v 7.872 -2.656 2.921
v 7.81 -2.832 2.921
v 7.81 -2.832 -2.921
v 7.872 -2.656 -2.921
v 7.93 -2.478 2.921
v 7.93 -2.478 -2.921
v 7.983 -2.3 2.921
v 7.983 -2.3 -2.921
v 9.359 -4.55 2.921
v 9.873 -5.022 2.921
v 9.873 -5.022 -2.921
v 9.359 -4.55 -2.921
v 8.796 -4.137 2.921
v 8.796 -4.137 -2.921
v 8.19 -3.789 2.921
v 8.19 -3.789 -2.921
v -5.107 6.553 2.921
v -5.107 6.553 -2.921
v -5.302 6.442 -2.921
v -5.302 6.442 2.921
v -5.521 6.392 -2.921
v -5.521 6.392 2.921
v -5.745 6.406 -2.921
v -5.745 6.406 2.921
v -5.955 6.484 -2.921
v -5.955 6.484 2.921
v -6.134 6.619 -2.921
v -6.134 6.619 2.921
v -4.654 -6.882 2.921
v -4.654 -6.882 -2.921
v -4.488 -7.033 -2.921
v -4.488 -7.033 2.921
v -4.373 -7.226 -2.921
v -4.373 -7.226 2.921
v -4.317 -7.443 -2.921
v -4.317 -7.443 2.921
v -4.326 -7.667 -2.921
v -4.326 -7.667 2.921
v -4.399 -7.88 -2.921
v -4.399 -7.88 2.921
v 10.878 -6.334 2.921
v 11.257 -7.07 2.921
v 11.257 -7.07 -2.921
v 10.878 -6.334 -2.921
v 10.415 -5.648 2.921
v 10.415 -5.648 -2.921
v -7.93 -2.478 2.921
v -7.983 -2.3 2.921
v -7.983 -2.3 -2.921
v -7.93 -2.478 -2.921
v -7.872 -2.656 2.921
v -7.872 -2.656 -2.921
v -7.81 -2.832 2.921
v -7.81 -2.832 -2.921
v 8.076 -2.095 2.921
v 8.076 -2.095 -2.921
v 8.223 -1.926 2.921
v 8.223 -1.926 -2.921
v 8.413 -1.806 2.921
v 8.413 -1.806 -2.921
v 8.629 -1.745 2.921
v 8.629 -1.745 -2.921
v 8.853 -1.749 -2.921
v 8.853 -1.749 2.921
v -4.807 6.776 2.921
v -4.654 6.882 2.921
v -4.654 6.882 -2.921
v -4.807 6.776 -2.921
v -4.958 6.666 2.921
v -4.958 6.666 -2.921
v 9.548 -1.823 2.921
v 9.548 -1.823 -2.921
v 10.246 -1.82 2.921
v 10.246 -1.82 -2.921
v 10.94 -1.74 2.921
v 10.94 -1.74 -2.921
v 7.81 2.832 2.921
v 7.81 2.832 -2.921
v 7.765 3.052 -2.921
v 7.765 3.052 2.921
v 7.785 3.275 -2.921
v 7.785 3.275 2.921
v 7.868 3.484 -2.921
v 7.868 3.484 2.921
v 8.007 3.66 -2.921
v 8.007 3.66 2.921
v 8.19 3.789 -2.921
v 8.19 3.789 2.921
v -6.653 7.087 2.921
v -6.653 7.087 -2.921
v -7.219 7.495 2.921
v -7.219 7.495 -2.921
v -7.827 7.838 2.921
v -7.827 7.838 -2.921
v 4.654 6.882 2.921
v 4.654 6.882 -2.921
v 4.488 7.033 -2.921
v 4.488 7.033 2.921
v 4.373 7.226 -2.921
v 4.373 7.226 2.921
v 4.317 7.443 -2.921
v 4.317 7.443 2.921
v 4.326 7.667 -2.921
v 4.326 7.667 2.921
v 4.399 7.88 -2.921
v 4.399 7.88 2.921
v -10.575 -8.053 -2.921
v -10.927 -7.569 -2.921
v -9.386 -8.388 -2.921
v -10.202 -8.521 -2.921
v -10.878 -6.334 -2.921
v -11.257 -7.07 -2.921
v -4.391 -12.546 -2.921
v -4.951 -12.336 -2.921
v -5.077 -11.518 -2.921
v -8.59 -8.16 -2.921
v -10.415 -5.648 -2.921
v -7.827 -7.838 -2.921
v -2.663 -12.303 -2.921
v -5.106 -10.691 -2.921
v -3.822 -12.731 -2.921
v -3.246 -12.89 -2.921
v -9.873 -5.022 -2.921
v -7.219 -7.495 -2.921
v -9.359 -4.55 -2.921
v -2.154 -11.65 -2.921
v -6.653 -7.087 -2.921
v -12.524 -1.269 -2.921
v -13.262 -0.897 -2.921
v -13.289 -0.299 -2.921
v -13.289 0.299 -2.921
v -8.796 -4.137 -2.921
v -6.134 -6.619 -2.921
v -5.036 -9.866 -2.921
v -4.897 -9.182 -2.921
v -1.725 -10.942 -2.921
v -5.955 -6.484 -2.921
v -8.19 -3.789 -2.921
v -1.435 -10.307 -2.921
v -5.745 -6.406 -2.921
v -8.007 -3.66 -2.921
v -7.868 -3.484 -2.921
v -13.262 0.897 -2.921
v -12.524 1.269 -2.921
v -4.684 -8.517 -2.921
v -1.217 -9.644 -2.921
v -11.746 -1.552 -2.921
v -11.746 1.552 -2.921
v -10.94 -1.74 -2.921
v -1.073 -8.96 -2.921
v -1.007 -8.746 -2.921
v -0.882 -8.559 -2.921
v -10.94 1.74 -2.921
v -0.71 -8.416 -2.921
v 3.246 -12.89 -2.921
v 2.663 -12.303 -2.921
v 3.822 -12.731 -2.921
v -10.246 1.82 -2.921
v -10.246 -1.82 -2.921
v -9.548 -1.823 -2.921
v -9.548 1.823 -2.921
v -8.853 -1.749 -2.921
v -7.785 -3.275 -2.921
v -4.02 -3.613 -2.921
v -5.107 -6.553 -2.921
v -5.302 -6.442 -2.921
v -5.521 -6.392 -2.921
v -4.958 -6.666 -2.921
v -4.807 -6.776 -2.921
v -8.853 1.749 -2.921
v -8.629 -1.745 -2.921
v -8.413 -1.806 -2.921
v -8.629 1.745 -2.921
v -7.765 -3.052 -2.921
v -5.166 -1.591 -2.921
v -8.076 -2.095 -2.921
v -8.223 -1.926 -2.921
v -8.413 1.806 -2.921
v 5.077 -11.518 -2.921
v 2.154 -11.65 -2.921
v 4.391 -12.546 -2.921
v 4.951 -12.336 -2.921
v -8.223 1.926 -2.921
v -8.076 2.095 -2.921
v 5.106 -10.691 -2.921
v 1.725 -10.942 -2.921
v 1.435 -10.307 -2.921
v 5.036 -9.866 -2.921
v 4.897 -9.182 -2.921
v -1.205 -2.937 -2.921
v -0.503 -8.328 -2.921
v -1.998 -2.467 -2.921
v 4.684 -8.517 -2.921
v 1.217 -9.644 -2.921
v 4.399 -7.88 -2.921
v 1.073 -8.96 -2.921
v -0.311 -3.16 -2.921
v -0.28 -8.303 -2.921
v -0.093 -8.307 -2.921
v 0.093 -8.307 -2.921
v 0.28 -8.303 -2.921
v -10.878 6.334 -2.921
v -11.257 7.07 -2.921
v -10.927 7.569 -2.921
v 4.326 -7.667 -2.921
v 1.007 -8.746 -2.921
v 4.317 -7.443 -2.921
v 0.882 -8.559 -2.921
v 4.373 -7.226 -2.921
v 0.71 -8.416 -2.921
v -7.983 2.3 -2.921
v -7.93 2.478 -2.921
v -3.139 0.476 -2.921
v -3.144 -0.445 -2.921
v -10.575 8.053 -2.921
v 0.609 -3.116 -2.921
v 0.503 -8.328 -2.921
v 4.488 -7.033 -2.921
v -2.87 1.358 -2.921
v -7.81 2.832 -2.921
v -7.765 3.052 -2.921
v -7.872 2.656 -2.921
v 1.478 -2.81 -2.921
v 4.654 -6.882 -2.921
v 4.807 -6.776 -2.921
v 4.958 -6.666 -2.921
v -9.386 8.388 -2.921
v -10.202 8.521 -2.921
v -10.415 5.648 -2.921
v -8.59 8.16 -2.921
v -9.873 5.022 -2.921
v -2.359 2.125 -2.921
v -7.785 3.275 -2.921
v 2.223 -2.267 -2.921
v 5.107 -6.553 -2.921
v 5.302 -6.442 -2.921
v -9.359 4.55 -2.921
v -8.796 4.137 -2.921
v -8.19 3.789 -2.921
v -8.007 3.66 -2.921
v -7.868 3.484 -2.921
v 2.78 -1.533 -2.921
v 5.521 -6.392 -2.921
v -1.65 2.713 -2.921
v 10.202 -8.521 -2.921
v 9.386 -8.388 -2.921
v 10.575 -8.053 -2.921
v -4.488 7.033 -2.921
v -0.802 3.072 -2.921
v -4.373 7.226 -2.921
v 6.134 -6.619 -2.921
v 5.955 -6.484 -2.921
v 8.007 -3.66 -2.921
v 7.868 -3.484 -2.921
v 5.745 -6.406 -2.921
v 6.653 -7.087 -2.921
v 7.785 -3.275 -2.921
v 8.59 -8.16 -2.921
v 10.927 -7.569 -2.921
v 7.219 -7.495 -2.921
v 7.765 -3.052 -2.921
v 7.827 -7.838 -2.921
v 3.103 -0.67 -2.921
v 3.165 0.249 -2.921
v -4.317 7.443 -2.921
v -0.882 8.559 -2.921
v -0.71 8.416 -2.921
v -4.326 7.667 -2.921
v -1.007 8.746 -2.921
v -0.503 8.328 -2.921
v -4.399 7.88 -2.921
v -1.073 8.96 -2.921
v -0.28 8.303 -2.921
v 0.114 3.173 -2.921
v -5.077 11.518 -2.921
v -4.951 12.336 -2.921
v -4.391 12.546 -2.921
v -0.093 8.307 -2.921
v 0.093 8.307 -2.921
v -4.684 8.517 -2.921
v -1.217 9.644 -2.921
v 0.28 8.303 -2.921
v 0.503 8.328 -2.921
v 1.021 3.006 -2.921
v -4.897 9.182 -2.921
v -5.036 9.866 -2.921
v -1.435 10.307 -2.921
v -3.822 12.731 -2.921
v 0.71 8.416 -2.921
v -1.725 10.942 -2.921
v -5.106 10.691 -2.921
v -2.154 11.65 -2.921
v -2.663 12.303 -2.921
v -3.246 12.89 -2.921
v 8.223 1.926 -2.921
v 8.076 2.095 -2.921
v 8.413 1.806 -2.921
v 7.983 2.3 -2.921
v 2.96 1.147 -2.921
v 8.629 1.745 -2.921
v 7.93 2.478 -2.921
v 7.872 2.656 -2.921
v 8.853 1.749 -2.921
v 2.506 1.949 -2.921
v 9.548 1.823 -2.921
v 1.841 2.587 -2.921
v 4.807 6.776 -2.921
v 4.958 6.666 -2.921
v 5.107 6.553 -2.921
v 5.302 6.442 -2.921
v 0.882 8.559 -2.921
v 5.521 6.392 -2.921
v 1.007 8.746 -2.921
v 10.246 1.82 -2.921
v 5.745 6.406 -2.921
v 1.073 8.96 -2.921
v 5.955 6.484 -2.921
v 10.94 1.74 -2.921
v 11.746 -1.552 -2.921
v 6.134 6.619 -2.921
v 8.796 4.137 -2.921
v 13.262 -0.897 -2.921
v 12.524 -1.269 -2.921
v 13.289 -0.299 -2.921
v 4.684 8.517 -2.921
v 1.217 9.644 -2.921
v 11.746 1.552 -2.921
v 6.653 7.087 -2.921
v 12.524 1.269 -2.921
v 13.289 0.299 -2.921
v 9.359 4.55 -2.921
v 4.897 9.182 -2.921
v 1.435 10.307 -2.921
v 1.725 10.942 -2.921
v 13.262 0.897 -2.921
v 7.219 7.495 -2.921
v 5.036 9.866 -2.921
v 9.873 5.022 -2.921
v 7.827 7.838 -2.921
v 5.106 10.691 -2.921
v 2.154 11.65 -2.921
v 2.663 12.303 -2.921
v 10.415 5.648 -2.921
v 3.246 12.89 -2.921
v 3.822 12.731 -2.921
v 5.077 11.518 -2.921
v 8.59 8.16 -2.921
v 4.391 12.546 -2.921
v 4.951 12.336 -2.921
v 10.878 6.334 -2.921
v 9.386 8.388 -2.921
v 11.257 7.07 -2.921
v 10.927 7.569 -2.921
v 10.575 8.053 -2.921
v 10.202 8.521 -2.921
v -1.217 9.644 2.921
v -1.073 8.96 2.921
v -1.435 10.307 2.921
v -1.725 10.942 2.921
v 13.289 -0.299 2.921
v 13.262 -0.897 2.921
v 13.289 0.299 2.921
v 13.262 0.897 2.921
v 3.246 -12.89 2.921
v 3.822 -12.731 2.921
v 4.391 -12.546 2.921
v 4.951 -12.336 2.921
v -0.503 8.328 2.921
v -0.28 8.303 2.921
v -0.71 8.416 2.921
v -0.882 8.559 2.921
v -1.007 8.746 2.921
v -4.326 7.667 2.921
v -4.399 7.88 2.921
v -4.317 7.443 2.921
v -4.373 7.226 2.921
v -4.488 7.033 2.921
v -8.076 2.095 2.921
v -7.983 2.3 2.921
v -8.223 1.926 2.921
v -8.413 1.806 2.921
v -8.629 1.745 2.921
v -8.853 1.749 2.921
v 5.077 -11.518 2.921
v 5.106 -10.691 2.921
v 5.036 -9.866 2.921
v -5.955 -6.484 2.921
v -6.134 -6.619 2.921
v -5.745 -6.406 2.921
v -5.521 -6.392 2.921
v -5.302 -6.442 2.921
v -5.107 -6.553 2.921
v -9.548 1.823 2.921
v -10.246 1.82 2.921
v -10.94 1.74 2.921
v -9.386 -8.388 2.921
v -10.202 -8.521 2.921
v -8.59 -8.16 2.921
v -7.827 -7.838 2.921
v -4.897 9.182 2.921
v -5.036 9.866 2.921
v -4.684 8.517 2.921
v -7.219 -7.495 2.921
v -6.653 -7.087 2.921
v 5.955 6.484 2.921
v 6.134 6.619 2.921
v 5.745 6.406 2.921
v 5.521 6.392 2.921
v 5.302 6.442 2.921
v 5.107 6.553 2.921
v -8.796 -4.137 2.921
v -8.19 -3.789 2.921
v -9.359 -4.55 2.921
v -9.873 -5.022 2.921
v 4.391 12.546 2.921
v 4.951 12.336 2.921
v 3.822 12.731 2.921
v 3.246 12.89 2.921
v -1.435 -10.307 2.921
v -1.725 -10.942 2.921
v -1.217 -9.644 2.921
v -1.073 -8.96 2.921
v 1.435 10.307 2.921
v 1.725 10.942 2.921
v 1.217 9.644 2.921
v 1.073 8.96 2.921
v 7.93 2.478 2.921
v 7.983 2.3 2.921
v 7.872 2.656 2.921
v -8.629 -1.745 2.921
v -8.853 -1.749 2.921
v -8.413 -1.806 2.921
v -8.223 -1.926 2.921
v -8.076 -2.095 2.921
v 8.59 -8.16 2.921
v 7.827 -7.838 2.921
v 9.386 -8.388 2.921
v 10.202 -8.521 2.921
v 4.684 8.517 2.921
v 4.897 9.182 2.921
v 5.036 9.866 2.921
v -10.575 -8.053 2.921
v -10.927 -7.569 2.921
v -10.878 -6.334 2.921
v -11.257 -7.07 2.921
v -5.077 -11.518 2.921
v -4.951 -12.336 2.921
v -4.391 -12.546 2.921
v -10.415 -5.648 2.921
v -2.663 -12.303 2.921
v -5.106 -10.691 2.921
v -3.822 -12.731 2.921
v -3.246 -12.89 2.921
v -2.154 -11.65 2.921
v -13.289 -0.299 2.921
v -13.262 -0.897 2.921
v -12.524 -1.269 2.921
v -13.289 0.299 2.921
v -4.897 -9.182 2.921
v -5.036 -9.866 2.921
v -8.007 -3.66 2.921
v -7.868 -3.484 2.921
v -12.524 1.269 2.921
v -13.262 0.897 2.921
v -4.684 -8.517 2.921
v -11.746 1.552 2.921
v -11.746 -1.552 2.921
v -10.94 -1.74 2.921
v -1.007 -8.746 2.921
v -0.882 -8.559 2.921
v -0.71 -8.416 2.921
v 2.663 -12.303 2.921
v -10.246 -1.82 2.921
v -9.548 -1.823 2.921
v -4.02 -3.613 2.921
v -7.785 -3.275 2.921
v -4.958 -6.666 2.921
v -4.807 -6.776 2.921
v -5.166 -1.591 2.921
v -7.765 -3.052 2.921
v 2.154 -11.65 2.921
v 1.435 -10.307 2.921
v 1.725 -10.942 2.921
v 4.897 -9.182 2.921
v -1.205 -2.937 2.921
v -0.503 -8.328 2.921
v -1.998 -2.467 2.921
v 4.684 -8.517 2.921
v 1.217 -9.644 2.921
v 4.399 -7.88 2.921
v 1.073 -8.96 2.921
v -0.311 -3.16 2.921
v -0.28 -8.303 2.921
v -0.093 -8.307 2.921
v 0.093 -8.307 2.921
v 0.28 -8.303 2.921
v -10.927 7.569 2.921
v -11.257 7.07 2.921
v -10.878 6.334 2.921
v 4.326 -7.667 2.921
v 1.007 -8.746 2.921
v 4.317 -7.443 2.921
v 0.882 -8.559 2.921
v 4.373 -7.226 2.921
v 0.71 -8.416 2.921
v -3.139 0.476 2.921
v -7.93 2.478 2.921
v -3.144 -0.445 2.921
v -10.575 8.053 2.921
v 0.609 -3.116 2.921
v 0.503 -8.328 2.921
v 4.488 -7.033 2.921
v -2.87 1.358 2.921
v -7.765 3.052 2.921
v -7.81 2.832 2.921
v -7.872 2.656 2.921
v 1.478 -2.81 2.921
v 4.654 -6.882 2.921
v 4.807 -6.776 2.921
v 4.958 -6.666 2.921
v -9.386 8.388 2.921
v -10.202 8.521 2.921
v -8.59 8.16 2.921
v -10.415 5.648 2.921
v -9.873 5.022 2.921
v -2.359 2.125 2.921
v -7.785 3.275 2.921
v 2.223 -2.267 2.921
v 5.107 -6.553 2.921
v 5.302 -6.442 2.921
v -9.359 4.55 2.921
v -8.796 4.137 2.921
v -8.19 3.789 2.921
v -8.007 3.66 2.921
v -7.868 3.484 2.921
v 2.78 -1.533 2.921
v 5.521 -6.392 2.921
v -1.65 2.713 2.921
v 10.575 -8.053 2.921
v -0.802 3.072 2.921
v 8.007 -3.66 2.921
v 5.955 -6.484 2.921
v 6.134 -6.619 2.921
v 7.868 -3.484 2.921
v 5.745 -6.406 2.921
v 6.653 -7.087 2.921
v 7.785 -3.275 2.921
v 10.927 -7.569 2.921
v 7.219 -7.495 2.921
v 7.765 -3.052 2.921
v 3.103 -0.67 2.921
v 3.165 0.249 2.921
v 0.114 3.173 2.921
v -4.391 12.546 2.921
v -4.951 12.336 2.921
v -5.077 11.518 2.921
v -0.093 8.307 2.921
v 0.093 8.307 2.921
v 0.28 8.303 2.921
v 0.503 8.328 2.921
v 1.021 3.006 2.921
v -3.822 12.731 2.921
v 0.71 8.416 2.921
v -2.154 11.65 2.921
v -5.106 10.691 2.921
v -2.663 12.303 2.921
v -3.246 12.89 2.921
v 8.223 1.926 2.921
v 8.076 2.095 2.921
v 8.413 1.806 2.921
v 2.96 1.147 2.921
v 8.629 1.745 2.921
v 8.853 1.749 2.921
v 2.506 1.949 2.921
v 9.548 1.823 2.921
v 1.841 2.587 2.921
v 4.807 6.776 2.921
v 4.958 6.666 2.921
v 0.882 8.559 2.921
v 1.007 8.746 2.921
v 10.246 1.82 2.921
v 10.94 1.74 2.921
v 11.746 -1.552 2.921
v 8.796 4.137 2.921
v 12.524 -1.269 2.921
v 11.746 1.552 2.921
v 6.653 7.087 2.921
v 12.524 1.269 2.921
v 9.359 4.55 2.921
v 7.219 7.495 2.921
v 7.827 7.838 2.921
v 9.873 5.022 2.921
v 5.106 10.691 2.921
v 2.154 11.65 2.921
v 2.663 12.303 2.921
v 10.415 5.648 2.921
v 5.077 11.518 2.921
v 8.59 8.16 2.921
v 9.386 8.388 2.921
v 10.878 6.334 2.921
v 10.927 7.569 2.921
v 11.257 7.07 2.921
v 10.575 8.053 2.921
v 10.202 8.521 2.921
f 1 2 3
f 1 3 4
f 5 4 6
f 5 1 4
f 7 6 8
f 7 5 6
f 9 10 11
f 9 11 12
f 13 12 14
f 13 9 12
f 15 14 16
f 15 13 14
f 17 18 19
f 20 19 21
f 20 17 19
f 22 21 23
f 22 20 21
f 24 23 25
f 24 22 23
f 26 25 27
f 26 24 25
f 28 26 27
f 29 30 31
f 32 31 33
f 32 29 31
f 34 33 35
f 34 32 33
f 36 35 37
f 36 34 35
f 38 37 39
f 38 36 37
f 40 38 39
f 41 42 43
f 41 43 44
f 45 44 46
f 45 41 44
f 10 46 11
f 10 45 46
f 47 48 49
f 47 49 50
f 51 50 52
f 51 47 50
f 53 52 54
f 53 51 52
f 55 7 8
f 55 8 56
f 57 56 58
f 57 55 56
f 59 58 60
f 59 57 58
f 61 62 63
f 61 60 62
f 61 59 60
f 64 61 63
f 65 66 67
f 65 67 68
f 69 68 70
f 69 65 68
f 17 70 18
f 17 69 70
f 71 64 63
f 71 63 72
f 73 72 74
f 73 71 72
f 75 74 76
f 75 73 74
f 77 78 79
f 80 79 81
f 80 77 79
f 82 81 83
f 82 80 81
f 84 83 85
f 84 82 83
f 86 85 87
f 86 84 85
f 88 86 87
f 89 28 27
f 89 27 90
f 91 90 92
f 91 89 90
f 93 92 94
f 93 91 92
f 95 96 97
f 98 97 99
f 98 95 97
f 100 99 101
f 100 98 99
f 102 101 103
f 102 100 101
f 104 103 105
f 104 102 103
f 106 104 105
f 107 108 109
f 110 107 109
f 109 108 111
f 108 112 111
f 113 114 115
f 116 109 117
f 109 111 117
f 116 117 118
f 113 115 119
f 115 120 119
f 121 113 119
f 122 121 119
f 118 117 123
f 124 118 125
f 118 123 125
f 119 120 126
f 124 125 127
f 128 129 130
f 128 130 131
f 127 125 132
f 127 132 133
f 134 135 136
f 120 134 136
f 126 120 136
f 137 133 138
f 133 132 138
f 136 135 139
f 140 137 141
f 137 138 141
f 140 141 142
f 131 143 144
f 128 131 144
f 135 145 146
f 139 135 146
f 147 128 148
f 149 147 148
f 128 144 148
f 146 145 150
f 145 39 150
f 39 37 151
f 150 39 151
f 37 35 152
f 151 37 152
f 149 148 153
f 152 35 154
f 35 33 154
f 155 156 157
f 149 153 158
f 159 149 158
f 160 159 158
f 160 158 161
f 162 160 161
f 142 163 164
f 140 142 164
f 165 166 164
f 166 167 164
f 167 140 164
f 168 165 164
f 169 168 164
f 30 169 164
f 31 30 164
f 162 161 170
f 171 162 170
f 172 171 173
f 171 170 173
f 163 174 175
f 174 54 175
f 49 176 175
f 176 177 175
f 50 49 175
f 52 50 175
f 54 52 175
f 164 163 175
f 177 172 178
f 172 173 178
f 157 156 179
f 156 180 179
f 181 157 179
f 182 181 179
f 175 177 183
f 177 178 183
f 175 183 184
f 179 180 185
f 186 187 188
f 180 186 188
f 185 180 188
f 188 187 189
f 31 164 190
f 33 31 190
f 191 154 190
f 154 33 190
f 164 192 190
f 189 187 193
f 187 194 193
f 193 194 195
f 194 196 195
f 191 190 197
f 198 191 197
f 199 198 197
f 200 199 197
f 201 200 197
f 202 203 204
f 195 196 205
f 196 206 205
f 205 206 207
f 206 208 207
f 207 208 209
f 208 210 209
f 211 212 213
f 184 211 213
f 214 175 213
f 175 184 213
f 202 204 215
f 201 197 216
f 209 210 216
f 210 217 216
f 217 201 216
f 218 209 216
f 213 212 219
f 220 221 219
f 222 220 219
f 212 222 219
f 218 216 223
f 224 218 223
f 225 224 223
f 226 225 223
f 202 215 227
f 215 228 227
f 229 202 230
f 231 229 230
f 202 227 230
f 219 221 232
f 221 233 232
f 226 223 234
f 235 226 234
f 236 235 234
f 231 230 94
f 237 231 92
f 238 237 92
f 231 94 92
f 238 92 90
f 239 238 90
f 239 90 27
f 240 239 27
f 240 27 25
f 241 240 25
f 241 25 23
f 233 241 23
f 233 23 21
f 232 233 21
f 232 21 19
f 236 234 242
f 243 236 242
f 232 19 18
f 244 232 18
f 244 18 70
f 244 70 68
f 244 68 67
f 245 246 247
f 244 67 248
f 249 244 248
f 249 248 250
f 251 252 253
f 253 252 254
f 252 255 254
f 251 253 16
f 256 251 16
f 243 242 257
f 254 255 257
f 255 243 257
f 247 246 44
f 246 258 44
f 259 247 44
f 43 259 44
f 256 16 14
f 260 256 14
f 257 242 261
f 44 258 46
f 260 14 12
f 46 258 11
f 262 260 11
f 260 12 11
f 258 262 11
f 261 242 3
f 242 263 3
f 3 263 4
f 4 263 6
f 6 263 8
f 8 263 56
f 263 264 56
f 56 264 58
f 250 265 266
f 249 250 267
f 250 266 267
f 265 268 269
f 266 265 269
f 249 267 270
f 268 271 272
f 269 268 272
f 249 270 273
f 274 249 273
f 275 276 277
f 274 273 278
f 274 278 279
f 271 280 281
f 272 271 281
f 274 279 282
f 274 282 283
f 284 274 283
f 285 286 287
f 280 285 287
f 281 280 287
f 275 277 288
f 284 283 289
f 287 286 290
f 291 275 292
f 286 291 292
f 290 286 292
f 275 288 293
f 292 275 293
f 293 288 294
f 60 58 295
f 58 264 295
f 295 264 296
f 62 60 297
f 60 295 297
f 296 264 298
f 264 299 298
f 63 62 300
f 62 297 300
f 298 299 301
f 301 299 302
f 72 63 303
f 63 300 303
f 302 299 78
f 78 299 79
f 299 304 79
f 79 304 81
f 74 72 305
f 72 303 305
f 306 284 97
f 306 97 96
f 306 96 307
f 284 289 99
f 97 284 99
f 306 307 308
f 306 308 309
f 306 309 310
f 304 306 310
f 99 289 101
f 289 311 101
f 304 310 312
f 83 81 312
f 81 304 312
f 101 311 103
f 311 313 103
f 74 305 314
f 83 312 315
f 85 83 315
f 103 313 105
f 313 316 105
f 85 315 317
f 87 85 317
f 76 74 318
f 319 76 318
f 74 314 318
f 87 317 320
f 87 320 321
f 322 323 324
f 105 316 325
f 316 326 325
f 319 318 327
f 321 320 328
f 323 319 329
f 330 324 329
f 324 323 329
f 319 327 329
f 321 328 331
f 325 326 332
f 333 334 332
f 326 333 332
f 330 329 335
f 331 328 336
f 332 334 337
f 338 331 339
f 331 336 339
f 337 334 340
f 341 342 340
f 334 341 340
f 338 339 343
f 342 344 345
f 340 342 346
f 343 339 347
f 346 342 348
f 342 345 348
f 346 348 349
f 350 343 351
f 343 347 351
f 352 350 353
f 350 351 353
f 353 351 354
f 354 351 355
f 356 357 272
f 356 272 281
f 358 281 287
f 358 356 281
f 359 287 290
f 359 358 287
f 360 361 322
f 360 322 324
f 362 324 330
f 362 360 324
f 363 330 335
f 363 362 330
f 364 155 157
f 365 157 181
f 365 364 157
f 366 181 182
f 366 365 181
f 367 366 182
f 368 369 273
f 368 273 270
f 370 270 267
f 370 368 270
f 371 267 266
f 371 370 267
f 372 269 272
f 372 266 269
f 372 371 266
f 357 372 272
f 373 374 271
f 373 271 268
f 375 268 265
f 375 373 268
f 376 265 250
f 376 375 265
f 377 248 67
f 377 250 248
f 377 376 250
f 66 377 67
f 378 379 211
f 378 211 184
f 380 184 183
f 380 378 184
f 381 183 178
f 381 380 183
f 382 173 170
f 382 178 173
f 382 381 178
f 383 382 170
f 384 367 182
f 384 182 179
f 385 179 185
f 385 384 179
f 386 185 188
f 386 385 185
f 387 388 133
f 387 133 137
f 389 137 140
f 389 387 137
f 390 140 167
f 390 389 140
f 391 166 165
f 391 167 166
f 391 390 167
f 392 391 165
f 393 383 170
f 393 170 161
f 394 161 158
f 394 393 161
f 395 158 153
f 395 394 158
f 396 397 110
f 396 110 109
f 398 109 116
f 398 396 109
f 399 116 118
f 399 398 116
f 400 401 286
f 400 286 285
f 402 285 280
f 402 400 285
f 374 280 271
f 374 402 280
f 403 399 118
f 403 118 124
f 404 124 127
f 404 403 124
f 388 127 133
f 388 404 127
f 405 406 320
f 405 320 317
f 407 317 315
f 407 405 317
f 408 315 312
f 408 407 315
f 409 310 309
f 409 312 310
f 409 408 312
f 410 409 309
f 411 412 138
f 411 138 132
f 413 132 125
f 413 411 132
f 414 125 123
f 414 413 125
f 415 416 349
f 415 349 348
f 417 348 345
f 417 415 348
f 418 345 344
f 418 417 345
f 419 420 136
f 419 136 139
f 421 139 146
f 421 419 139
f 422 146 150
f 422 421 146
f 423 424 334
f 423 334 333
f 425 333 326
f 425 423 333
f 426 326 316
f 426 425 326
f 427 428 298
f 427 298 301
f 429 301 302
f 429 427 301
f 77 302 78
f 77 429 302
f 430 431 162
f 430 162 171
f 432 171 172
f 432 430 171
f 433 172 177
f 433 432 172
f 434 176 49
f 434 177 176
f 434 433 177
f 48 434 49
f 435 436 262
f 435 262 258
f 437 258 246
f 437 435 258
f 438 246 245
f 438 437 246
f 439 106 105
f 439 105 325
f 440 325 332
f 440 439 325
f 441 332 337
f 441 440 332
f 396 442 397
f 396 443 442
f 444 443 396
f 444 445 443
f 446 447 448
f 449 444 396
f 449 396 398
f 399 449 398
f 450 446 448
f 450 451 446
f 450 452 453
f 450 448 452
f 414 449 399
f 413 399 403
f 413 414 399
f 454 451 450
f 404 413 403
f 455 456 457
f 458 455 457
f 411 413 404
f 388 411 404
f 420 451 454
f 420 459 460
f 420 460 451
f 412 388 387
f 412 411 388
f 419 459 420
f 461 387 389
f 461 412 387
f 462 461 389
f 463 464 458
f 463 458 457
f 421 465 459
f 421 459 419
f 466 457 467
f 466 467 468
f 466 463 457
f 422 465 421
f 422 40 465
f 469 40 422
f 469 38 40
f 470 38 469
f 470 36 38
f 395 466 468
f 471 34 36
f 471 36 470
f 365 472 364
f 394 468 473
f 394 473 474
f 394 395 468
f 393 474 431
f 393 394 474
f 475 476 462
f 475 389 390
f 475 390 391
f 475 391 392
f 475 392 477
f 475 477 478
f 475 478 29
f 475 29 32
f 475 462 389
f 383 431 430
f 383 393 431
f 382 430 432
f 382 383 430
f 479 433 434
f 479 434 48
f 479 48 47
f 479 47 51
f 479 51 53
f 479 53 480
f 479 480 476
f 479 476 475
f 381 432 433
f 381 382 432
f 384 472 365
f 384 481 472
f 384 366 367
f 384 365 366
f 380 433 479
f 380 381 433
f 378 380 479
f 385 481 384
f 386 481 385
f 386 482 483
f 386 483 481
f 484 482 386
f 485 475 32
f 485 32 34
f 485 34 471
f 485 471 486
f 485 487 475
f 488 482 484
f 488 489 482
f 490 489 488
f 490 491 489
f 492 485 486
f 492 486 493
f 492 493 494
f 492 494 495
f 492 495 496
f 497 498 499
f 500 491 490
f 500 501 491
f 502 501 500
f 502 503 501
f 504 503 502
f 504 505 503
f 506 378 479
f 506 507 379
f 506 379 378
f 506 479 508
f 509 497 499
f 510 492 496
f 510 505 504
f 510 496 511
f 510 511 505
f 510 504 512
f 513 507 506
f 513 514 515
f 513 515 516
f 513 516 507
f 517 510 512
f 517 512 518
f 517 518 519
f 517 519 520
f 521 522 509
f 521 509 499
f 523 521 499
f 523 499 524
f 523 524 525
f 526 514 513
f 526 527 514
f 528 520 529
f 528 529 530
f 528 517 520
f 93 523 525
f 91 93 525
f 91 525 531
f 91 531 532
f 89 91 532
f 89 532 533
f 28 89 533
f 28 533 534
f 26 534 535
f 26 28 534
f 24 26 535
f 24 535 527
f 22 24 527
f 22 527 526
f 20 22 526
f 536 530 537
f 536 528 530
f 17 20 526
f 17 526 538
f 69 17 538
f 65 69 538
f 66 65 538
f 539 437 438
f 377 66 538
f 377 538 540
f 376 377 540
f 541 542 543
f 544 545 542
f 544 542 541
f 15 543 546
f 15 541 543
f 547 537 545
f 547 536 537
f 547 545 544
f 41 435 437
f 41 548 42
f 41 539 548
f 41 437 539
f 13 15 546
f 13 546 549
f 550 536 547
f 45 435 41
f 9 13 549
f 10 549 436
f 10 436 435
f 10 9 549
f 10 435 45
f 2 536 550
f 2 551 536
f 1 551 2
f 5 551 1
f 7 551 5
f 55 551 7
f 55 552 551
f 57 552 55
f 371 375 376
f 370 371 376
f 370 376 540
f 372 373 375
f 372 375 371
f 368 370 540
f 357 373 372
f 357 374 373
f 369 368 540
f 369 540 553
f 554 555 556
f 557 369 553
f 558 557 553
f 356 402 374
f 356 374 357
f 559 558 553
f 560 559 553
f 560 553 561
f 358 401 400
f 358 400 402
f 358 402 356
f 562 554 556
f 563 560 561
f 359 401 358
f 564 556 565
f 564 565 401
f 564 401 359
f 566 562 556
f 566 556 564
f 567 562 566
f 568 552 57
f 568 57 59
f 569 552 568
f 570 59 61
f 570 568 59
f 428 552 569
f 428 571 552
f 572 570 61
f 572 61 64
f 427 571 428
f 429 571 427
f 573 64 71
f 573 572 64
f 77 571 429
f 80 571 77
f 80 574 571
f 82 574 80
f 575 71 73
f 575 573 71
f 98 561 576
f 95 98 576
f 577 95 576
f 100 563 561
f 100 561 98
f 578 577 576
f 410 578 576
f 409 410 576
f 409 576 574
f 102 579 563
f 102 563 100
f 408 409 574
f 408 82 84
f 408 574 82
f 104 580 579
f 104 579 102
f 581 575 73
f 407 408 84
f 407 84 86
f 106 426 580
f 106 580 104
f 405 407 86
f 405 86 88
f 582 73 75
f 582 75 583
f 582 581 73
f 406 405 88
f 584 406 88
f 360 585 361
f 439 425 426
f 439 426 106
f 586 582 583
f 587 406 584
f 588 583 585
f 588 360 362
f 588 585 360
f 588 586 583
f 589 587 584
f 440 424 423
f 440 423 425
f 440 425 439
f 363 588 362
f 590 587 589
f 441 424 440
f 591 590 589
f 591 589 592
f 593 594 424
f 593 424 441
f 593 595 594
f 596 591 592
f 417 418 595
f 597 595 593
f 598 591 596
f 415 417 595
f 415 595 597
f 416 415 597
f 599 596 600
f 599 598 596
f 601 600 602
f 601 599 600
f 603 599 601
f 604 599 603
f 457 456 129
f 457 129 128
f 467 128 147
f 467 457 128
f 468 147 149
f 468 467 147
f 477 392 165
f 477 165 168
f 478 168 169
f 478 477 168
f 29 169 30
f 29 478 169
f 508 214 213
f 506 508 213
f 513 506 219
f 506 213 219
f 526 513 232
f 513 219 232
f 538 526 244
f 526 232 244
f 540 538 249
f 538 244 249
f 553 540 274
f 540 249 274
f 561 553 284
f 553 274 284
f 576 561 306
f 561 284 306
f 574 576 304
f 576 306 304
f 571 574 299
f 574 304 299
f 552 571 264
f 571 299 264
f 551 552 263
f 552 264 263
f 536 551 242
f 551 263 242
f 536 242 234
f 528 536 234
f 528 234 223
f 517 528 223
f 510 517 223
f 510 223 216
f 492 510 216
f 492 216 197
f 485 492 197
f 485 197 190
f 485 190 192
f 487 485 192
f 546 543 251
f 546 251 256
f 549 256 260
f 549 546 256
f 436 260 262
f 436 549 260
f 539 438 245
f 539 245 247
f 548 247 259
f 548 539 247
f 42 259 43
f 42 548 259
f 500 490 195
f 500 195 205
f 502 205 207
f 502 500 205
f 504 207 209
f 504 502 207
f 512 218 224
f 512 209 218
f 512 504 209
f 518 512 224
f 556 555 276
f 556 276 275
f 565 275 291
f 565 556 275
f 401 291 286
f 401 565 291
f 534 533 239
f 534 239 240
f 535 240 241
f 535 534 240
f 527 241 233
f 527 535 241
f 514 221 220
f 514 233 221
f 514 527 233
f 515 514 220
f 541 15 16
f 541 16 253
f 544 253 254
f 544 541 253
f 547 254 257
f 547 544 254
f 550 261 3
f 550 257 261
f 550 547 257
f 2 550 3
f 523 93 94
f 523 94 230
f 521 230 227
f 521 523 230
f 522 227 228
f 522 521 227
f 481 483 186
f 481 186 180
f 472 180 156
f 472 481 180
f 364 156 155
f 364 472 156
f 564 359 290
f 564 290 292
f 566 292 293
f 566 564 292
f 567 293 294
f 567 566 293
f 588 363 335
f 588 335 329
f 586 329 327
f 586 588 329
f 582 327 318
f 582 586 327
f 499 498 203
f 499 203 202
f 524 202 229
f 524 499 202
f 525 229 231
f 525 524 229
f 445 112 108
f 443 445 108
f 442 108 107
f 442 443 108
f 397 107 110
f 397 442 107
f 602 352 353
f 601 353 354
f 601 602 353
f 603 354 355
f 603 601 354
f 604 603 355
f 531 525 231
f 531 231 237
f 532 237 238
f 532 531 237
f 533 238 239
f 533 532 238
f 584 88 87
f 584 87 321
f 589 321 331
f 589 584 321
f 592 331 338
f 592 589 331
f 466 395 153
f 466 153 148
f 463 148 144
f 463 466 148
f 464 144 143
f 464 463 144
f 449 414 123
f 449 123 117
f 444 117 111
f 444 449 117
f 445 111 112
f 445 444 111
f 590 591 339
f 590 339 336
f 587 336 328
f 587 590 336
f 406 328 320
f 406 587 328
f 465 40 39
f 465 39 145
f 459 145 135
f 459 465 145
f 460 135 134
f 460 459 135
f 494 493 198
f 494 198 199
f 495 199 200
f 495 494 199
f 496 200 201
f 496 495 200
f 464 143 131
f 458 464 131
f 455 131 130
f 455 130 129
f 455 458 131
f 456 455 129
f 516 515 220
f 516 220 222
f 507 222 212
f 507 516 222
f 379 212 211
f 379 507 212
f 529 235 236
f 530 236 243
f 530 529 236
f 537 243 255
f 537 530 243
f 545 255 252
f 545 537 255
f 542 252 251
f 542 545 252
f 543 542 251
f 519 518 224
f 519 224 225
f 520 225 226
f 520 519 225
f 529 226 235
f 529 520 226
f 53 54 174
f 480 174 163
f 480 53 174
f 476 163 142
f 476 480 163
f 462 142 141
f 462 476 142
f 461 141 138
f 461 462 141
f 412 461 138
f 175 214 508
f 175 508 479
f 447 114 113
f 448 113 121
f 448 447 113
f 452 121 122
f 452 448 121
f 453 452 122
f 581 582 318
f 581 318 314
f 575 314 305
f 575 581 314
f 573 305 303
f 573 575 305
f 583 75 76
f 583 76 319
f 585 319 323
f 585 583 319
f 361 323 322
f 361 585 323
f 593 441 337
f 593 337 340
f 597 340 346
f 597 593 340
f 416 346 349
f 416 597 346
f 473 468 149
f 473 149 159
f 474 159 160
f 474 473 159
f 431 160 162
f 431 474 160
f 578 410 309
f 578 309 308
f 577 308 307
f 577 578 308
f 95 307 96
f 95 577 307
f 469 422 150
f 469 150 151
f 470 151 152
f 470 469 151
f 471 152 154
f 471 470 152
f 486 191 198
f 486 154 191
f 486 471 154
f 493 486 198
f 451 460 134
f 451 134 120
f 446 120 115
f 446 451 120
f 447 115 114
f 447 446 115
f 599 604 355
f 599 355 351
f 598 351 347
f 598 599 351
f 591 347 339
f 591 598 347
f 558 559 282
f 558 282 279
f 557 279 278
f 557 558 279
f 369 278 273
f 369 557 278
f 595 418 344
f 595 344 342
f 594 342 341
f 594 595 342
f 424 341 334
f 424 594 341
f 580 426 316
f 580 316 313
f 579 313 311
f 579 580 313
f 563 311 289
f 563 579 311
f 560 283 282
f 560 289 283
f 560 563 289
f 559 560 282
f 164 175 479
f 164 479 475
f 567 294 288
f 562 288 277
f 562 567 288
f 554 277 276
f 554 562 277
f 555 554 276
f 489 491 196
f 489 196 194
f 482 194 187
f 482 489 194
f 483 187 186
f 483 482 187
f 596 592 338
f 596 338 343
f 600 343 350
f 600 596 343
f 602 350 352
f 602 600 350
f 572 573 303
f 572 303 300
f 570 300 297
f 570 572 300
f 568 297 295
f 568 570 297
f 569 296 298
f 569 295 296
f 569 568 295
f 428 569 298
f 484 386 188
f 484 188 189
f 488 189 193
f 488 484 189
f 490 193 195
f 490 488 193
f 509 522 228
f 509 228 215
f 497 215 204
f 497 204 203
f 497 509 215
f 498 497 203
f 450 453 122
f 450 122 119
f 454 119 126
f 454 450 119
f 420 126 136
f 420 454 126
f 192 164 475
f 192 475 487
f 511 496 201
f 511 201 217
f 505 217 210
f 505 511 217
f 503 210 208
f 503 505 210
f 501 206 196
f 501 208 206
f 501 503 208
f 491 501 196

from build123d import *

# Parameters (mm, degrees)
SKETCH1_R          = 13.29266328
GEAR_BASE_DEPTH    = 2.921
GEAR_CUT_DEPTH     = 20.685496137
GEAR_TEETH_COUNT   = 10
CUT_EXTRUDE2_DEPTH = 20.416099984


with BuildPart() as part:
    # Sketch1 → GEAR_BASE (new, symmetric)
    with BuildSketch(Plane.XY):
        Circle(SKETCH1_R)
    extrude(amount=GEAR_BASE_DEPTH, both=True)

    # Sketch2 → GEAR_CUT (cut, through all)
    with BuildSketch(Plane.XY.offset(2.921)):
        with BuildLine():
            ThreePointArc((-11.256508875, -7.070071076), (-12.642074031, -4.107658854), (-13.262390488, -0.896602257))
            ThreePointArc((-13.262390488, -0.896602257), (-12.138766836, -1.422314596), (-10.939670247, -1.740231168))
            ThreePointArc((-10.939670247, -1.740231168), (-9.896826282, -1.831227702), (-8.853265833, -1.748853585))
            ThreePointArc((-8.853265833, -1.748853585), (-8.313717175, -1.858972165), (-7.983334635, -2.299524357))
            ThreePointArc((-7.983334635, -2.299524357), (-7.90129627, -2.567286784), (-7.810279896, -2.832132079))
            ThreePointArc((-7.810279896, -2.832132079), (-7.818614904, -3.382740273), (-8.19039286, -3.78896682))
            ThreePointArc((-8.19039286, -3.78896682), (-9.083069289, -4.335714202), (-9.873261359, -5.022300247))
            ThreePointArc((-9.873261359, -5.022300247), (-10.656484205, -5.984311448), (-11.256508875, -7.070071076))
        make_face()
    gear_cut = extrude(amount=-GEAR_CUT_DEPTH, mode=Mode.SUBTRACT)

    # GEAR_TEETH: GEAR_CUT ×10 about axis
    gear_teeth_axis = Axis((0, 0, 50), (0, 0, -1))
    for i in range(1, GEAR_TEETH_COUNT):
        add(gear_cut.rotate(gear_teeth_axis, i * 360 / GEAR_TEETH_COUNT), mode=Mode.SUBTRACT)

    # Sketch9 → Cut-Extrude2 (cut, through all)
    with BuildSketch(Plane(origin=(0, 0, -2.921), x_dir=(-1, 0, 0), z_dir=(0, 0, -1))):
        with BuildLine():
            Line((1.998092242, -2.467438428), (4.020440792, -3.612993749))
            Line((4.020440792, -3.612993749), (5.165996114, -1.590645198))
            Line((5.165996114, -1.590645198), (3.143647563, -0.445089877))
            ThreePointArc((3.143647563, -0.445089877), (-2.762579496, 1.564857671), (1.998092242, -2.467438428))
        make_face()
    extrude(amount=-CUT_EXTRUDE2_DEPTH, mode=Mode.SUBTRACT)


solid = part.part
